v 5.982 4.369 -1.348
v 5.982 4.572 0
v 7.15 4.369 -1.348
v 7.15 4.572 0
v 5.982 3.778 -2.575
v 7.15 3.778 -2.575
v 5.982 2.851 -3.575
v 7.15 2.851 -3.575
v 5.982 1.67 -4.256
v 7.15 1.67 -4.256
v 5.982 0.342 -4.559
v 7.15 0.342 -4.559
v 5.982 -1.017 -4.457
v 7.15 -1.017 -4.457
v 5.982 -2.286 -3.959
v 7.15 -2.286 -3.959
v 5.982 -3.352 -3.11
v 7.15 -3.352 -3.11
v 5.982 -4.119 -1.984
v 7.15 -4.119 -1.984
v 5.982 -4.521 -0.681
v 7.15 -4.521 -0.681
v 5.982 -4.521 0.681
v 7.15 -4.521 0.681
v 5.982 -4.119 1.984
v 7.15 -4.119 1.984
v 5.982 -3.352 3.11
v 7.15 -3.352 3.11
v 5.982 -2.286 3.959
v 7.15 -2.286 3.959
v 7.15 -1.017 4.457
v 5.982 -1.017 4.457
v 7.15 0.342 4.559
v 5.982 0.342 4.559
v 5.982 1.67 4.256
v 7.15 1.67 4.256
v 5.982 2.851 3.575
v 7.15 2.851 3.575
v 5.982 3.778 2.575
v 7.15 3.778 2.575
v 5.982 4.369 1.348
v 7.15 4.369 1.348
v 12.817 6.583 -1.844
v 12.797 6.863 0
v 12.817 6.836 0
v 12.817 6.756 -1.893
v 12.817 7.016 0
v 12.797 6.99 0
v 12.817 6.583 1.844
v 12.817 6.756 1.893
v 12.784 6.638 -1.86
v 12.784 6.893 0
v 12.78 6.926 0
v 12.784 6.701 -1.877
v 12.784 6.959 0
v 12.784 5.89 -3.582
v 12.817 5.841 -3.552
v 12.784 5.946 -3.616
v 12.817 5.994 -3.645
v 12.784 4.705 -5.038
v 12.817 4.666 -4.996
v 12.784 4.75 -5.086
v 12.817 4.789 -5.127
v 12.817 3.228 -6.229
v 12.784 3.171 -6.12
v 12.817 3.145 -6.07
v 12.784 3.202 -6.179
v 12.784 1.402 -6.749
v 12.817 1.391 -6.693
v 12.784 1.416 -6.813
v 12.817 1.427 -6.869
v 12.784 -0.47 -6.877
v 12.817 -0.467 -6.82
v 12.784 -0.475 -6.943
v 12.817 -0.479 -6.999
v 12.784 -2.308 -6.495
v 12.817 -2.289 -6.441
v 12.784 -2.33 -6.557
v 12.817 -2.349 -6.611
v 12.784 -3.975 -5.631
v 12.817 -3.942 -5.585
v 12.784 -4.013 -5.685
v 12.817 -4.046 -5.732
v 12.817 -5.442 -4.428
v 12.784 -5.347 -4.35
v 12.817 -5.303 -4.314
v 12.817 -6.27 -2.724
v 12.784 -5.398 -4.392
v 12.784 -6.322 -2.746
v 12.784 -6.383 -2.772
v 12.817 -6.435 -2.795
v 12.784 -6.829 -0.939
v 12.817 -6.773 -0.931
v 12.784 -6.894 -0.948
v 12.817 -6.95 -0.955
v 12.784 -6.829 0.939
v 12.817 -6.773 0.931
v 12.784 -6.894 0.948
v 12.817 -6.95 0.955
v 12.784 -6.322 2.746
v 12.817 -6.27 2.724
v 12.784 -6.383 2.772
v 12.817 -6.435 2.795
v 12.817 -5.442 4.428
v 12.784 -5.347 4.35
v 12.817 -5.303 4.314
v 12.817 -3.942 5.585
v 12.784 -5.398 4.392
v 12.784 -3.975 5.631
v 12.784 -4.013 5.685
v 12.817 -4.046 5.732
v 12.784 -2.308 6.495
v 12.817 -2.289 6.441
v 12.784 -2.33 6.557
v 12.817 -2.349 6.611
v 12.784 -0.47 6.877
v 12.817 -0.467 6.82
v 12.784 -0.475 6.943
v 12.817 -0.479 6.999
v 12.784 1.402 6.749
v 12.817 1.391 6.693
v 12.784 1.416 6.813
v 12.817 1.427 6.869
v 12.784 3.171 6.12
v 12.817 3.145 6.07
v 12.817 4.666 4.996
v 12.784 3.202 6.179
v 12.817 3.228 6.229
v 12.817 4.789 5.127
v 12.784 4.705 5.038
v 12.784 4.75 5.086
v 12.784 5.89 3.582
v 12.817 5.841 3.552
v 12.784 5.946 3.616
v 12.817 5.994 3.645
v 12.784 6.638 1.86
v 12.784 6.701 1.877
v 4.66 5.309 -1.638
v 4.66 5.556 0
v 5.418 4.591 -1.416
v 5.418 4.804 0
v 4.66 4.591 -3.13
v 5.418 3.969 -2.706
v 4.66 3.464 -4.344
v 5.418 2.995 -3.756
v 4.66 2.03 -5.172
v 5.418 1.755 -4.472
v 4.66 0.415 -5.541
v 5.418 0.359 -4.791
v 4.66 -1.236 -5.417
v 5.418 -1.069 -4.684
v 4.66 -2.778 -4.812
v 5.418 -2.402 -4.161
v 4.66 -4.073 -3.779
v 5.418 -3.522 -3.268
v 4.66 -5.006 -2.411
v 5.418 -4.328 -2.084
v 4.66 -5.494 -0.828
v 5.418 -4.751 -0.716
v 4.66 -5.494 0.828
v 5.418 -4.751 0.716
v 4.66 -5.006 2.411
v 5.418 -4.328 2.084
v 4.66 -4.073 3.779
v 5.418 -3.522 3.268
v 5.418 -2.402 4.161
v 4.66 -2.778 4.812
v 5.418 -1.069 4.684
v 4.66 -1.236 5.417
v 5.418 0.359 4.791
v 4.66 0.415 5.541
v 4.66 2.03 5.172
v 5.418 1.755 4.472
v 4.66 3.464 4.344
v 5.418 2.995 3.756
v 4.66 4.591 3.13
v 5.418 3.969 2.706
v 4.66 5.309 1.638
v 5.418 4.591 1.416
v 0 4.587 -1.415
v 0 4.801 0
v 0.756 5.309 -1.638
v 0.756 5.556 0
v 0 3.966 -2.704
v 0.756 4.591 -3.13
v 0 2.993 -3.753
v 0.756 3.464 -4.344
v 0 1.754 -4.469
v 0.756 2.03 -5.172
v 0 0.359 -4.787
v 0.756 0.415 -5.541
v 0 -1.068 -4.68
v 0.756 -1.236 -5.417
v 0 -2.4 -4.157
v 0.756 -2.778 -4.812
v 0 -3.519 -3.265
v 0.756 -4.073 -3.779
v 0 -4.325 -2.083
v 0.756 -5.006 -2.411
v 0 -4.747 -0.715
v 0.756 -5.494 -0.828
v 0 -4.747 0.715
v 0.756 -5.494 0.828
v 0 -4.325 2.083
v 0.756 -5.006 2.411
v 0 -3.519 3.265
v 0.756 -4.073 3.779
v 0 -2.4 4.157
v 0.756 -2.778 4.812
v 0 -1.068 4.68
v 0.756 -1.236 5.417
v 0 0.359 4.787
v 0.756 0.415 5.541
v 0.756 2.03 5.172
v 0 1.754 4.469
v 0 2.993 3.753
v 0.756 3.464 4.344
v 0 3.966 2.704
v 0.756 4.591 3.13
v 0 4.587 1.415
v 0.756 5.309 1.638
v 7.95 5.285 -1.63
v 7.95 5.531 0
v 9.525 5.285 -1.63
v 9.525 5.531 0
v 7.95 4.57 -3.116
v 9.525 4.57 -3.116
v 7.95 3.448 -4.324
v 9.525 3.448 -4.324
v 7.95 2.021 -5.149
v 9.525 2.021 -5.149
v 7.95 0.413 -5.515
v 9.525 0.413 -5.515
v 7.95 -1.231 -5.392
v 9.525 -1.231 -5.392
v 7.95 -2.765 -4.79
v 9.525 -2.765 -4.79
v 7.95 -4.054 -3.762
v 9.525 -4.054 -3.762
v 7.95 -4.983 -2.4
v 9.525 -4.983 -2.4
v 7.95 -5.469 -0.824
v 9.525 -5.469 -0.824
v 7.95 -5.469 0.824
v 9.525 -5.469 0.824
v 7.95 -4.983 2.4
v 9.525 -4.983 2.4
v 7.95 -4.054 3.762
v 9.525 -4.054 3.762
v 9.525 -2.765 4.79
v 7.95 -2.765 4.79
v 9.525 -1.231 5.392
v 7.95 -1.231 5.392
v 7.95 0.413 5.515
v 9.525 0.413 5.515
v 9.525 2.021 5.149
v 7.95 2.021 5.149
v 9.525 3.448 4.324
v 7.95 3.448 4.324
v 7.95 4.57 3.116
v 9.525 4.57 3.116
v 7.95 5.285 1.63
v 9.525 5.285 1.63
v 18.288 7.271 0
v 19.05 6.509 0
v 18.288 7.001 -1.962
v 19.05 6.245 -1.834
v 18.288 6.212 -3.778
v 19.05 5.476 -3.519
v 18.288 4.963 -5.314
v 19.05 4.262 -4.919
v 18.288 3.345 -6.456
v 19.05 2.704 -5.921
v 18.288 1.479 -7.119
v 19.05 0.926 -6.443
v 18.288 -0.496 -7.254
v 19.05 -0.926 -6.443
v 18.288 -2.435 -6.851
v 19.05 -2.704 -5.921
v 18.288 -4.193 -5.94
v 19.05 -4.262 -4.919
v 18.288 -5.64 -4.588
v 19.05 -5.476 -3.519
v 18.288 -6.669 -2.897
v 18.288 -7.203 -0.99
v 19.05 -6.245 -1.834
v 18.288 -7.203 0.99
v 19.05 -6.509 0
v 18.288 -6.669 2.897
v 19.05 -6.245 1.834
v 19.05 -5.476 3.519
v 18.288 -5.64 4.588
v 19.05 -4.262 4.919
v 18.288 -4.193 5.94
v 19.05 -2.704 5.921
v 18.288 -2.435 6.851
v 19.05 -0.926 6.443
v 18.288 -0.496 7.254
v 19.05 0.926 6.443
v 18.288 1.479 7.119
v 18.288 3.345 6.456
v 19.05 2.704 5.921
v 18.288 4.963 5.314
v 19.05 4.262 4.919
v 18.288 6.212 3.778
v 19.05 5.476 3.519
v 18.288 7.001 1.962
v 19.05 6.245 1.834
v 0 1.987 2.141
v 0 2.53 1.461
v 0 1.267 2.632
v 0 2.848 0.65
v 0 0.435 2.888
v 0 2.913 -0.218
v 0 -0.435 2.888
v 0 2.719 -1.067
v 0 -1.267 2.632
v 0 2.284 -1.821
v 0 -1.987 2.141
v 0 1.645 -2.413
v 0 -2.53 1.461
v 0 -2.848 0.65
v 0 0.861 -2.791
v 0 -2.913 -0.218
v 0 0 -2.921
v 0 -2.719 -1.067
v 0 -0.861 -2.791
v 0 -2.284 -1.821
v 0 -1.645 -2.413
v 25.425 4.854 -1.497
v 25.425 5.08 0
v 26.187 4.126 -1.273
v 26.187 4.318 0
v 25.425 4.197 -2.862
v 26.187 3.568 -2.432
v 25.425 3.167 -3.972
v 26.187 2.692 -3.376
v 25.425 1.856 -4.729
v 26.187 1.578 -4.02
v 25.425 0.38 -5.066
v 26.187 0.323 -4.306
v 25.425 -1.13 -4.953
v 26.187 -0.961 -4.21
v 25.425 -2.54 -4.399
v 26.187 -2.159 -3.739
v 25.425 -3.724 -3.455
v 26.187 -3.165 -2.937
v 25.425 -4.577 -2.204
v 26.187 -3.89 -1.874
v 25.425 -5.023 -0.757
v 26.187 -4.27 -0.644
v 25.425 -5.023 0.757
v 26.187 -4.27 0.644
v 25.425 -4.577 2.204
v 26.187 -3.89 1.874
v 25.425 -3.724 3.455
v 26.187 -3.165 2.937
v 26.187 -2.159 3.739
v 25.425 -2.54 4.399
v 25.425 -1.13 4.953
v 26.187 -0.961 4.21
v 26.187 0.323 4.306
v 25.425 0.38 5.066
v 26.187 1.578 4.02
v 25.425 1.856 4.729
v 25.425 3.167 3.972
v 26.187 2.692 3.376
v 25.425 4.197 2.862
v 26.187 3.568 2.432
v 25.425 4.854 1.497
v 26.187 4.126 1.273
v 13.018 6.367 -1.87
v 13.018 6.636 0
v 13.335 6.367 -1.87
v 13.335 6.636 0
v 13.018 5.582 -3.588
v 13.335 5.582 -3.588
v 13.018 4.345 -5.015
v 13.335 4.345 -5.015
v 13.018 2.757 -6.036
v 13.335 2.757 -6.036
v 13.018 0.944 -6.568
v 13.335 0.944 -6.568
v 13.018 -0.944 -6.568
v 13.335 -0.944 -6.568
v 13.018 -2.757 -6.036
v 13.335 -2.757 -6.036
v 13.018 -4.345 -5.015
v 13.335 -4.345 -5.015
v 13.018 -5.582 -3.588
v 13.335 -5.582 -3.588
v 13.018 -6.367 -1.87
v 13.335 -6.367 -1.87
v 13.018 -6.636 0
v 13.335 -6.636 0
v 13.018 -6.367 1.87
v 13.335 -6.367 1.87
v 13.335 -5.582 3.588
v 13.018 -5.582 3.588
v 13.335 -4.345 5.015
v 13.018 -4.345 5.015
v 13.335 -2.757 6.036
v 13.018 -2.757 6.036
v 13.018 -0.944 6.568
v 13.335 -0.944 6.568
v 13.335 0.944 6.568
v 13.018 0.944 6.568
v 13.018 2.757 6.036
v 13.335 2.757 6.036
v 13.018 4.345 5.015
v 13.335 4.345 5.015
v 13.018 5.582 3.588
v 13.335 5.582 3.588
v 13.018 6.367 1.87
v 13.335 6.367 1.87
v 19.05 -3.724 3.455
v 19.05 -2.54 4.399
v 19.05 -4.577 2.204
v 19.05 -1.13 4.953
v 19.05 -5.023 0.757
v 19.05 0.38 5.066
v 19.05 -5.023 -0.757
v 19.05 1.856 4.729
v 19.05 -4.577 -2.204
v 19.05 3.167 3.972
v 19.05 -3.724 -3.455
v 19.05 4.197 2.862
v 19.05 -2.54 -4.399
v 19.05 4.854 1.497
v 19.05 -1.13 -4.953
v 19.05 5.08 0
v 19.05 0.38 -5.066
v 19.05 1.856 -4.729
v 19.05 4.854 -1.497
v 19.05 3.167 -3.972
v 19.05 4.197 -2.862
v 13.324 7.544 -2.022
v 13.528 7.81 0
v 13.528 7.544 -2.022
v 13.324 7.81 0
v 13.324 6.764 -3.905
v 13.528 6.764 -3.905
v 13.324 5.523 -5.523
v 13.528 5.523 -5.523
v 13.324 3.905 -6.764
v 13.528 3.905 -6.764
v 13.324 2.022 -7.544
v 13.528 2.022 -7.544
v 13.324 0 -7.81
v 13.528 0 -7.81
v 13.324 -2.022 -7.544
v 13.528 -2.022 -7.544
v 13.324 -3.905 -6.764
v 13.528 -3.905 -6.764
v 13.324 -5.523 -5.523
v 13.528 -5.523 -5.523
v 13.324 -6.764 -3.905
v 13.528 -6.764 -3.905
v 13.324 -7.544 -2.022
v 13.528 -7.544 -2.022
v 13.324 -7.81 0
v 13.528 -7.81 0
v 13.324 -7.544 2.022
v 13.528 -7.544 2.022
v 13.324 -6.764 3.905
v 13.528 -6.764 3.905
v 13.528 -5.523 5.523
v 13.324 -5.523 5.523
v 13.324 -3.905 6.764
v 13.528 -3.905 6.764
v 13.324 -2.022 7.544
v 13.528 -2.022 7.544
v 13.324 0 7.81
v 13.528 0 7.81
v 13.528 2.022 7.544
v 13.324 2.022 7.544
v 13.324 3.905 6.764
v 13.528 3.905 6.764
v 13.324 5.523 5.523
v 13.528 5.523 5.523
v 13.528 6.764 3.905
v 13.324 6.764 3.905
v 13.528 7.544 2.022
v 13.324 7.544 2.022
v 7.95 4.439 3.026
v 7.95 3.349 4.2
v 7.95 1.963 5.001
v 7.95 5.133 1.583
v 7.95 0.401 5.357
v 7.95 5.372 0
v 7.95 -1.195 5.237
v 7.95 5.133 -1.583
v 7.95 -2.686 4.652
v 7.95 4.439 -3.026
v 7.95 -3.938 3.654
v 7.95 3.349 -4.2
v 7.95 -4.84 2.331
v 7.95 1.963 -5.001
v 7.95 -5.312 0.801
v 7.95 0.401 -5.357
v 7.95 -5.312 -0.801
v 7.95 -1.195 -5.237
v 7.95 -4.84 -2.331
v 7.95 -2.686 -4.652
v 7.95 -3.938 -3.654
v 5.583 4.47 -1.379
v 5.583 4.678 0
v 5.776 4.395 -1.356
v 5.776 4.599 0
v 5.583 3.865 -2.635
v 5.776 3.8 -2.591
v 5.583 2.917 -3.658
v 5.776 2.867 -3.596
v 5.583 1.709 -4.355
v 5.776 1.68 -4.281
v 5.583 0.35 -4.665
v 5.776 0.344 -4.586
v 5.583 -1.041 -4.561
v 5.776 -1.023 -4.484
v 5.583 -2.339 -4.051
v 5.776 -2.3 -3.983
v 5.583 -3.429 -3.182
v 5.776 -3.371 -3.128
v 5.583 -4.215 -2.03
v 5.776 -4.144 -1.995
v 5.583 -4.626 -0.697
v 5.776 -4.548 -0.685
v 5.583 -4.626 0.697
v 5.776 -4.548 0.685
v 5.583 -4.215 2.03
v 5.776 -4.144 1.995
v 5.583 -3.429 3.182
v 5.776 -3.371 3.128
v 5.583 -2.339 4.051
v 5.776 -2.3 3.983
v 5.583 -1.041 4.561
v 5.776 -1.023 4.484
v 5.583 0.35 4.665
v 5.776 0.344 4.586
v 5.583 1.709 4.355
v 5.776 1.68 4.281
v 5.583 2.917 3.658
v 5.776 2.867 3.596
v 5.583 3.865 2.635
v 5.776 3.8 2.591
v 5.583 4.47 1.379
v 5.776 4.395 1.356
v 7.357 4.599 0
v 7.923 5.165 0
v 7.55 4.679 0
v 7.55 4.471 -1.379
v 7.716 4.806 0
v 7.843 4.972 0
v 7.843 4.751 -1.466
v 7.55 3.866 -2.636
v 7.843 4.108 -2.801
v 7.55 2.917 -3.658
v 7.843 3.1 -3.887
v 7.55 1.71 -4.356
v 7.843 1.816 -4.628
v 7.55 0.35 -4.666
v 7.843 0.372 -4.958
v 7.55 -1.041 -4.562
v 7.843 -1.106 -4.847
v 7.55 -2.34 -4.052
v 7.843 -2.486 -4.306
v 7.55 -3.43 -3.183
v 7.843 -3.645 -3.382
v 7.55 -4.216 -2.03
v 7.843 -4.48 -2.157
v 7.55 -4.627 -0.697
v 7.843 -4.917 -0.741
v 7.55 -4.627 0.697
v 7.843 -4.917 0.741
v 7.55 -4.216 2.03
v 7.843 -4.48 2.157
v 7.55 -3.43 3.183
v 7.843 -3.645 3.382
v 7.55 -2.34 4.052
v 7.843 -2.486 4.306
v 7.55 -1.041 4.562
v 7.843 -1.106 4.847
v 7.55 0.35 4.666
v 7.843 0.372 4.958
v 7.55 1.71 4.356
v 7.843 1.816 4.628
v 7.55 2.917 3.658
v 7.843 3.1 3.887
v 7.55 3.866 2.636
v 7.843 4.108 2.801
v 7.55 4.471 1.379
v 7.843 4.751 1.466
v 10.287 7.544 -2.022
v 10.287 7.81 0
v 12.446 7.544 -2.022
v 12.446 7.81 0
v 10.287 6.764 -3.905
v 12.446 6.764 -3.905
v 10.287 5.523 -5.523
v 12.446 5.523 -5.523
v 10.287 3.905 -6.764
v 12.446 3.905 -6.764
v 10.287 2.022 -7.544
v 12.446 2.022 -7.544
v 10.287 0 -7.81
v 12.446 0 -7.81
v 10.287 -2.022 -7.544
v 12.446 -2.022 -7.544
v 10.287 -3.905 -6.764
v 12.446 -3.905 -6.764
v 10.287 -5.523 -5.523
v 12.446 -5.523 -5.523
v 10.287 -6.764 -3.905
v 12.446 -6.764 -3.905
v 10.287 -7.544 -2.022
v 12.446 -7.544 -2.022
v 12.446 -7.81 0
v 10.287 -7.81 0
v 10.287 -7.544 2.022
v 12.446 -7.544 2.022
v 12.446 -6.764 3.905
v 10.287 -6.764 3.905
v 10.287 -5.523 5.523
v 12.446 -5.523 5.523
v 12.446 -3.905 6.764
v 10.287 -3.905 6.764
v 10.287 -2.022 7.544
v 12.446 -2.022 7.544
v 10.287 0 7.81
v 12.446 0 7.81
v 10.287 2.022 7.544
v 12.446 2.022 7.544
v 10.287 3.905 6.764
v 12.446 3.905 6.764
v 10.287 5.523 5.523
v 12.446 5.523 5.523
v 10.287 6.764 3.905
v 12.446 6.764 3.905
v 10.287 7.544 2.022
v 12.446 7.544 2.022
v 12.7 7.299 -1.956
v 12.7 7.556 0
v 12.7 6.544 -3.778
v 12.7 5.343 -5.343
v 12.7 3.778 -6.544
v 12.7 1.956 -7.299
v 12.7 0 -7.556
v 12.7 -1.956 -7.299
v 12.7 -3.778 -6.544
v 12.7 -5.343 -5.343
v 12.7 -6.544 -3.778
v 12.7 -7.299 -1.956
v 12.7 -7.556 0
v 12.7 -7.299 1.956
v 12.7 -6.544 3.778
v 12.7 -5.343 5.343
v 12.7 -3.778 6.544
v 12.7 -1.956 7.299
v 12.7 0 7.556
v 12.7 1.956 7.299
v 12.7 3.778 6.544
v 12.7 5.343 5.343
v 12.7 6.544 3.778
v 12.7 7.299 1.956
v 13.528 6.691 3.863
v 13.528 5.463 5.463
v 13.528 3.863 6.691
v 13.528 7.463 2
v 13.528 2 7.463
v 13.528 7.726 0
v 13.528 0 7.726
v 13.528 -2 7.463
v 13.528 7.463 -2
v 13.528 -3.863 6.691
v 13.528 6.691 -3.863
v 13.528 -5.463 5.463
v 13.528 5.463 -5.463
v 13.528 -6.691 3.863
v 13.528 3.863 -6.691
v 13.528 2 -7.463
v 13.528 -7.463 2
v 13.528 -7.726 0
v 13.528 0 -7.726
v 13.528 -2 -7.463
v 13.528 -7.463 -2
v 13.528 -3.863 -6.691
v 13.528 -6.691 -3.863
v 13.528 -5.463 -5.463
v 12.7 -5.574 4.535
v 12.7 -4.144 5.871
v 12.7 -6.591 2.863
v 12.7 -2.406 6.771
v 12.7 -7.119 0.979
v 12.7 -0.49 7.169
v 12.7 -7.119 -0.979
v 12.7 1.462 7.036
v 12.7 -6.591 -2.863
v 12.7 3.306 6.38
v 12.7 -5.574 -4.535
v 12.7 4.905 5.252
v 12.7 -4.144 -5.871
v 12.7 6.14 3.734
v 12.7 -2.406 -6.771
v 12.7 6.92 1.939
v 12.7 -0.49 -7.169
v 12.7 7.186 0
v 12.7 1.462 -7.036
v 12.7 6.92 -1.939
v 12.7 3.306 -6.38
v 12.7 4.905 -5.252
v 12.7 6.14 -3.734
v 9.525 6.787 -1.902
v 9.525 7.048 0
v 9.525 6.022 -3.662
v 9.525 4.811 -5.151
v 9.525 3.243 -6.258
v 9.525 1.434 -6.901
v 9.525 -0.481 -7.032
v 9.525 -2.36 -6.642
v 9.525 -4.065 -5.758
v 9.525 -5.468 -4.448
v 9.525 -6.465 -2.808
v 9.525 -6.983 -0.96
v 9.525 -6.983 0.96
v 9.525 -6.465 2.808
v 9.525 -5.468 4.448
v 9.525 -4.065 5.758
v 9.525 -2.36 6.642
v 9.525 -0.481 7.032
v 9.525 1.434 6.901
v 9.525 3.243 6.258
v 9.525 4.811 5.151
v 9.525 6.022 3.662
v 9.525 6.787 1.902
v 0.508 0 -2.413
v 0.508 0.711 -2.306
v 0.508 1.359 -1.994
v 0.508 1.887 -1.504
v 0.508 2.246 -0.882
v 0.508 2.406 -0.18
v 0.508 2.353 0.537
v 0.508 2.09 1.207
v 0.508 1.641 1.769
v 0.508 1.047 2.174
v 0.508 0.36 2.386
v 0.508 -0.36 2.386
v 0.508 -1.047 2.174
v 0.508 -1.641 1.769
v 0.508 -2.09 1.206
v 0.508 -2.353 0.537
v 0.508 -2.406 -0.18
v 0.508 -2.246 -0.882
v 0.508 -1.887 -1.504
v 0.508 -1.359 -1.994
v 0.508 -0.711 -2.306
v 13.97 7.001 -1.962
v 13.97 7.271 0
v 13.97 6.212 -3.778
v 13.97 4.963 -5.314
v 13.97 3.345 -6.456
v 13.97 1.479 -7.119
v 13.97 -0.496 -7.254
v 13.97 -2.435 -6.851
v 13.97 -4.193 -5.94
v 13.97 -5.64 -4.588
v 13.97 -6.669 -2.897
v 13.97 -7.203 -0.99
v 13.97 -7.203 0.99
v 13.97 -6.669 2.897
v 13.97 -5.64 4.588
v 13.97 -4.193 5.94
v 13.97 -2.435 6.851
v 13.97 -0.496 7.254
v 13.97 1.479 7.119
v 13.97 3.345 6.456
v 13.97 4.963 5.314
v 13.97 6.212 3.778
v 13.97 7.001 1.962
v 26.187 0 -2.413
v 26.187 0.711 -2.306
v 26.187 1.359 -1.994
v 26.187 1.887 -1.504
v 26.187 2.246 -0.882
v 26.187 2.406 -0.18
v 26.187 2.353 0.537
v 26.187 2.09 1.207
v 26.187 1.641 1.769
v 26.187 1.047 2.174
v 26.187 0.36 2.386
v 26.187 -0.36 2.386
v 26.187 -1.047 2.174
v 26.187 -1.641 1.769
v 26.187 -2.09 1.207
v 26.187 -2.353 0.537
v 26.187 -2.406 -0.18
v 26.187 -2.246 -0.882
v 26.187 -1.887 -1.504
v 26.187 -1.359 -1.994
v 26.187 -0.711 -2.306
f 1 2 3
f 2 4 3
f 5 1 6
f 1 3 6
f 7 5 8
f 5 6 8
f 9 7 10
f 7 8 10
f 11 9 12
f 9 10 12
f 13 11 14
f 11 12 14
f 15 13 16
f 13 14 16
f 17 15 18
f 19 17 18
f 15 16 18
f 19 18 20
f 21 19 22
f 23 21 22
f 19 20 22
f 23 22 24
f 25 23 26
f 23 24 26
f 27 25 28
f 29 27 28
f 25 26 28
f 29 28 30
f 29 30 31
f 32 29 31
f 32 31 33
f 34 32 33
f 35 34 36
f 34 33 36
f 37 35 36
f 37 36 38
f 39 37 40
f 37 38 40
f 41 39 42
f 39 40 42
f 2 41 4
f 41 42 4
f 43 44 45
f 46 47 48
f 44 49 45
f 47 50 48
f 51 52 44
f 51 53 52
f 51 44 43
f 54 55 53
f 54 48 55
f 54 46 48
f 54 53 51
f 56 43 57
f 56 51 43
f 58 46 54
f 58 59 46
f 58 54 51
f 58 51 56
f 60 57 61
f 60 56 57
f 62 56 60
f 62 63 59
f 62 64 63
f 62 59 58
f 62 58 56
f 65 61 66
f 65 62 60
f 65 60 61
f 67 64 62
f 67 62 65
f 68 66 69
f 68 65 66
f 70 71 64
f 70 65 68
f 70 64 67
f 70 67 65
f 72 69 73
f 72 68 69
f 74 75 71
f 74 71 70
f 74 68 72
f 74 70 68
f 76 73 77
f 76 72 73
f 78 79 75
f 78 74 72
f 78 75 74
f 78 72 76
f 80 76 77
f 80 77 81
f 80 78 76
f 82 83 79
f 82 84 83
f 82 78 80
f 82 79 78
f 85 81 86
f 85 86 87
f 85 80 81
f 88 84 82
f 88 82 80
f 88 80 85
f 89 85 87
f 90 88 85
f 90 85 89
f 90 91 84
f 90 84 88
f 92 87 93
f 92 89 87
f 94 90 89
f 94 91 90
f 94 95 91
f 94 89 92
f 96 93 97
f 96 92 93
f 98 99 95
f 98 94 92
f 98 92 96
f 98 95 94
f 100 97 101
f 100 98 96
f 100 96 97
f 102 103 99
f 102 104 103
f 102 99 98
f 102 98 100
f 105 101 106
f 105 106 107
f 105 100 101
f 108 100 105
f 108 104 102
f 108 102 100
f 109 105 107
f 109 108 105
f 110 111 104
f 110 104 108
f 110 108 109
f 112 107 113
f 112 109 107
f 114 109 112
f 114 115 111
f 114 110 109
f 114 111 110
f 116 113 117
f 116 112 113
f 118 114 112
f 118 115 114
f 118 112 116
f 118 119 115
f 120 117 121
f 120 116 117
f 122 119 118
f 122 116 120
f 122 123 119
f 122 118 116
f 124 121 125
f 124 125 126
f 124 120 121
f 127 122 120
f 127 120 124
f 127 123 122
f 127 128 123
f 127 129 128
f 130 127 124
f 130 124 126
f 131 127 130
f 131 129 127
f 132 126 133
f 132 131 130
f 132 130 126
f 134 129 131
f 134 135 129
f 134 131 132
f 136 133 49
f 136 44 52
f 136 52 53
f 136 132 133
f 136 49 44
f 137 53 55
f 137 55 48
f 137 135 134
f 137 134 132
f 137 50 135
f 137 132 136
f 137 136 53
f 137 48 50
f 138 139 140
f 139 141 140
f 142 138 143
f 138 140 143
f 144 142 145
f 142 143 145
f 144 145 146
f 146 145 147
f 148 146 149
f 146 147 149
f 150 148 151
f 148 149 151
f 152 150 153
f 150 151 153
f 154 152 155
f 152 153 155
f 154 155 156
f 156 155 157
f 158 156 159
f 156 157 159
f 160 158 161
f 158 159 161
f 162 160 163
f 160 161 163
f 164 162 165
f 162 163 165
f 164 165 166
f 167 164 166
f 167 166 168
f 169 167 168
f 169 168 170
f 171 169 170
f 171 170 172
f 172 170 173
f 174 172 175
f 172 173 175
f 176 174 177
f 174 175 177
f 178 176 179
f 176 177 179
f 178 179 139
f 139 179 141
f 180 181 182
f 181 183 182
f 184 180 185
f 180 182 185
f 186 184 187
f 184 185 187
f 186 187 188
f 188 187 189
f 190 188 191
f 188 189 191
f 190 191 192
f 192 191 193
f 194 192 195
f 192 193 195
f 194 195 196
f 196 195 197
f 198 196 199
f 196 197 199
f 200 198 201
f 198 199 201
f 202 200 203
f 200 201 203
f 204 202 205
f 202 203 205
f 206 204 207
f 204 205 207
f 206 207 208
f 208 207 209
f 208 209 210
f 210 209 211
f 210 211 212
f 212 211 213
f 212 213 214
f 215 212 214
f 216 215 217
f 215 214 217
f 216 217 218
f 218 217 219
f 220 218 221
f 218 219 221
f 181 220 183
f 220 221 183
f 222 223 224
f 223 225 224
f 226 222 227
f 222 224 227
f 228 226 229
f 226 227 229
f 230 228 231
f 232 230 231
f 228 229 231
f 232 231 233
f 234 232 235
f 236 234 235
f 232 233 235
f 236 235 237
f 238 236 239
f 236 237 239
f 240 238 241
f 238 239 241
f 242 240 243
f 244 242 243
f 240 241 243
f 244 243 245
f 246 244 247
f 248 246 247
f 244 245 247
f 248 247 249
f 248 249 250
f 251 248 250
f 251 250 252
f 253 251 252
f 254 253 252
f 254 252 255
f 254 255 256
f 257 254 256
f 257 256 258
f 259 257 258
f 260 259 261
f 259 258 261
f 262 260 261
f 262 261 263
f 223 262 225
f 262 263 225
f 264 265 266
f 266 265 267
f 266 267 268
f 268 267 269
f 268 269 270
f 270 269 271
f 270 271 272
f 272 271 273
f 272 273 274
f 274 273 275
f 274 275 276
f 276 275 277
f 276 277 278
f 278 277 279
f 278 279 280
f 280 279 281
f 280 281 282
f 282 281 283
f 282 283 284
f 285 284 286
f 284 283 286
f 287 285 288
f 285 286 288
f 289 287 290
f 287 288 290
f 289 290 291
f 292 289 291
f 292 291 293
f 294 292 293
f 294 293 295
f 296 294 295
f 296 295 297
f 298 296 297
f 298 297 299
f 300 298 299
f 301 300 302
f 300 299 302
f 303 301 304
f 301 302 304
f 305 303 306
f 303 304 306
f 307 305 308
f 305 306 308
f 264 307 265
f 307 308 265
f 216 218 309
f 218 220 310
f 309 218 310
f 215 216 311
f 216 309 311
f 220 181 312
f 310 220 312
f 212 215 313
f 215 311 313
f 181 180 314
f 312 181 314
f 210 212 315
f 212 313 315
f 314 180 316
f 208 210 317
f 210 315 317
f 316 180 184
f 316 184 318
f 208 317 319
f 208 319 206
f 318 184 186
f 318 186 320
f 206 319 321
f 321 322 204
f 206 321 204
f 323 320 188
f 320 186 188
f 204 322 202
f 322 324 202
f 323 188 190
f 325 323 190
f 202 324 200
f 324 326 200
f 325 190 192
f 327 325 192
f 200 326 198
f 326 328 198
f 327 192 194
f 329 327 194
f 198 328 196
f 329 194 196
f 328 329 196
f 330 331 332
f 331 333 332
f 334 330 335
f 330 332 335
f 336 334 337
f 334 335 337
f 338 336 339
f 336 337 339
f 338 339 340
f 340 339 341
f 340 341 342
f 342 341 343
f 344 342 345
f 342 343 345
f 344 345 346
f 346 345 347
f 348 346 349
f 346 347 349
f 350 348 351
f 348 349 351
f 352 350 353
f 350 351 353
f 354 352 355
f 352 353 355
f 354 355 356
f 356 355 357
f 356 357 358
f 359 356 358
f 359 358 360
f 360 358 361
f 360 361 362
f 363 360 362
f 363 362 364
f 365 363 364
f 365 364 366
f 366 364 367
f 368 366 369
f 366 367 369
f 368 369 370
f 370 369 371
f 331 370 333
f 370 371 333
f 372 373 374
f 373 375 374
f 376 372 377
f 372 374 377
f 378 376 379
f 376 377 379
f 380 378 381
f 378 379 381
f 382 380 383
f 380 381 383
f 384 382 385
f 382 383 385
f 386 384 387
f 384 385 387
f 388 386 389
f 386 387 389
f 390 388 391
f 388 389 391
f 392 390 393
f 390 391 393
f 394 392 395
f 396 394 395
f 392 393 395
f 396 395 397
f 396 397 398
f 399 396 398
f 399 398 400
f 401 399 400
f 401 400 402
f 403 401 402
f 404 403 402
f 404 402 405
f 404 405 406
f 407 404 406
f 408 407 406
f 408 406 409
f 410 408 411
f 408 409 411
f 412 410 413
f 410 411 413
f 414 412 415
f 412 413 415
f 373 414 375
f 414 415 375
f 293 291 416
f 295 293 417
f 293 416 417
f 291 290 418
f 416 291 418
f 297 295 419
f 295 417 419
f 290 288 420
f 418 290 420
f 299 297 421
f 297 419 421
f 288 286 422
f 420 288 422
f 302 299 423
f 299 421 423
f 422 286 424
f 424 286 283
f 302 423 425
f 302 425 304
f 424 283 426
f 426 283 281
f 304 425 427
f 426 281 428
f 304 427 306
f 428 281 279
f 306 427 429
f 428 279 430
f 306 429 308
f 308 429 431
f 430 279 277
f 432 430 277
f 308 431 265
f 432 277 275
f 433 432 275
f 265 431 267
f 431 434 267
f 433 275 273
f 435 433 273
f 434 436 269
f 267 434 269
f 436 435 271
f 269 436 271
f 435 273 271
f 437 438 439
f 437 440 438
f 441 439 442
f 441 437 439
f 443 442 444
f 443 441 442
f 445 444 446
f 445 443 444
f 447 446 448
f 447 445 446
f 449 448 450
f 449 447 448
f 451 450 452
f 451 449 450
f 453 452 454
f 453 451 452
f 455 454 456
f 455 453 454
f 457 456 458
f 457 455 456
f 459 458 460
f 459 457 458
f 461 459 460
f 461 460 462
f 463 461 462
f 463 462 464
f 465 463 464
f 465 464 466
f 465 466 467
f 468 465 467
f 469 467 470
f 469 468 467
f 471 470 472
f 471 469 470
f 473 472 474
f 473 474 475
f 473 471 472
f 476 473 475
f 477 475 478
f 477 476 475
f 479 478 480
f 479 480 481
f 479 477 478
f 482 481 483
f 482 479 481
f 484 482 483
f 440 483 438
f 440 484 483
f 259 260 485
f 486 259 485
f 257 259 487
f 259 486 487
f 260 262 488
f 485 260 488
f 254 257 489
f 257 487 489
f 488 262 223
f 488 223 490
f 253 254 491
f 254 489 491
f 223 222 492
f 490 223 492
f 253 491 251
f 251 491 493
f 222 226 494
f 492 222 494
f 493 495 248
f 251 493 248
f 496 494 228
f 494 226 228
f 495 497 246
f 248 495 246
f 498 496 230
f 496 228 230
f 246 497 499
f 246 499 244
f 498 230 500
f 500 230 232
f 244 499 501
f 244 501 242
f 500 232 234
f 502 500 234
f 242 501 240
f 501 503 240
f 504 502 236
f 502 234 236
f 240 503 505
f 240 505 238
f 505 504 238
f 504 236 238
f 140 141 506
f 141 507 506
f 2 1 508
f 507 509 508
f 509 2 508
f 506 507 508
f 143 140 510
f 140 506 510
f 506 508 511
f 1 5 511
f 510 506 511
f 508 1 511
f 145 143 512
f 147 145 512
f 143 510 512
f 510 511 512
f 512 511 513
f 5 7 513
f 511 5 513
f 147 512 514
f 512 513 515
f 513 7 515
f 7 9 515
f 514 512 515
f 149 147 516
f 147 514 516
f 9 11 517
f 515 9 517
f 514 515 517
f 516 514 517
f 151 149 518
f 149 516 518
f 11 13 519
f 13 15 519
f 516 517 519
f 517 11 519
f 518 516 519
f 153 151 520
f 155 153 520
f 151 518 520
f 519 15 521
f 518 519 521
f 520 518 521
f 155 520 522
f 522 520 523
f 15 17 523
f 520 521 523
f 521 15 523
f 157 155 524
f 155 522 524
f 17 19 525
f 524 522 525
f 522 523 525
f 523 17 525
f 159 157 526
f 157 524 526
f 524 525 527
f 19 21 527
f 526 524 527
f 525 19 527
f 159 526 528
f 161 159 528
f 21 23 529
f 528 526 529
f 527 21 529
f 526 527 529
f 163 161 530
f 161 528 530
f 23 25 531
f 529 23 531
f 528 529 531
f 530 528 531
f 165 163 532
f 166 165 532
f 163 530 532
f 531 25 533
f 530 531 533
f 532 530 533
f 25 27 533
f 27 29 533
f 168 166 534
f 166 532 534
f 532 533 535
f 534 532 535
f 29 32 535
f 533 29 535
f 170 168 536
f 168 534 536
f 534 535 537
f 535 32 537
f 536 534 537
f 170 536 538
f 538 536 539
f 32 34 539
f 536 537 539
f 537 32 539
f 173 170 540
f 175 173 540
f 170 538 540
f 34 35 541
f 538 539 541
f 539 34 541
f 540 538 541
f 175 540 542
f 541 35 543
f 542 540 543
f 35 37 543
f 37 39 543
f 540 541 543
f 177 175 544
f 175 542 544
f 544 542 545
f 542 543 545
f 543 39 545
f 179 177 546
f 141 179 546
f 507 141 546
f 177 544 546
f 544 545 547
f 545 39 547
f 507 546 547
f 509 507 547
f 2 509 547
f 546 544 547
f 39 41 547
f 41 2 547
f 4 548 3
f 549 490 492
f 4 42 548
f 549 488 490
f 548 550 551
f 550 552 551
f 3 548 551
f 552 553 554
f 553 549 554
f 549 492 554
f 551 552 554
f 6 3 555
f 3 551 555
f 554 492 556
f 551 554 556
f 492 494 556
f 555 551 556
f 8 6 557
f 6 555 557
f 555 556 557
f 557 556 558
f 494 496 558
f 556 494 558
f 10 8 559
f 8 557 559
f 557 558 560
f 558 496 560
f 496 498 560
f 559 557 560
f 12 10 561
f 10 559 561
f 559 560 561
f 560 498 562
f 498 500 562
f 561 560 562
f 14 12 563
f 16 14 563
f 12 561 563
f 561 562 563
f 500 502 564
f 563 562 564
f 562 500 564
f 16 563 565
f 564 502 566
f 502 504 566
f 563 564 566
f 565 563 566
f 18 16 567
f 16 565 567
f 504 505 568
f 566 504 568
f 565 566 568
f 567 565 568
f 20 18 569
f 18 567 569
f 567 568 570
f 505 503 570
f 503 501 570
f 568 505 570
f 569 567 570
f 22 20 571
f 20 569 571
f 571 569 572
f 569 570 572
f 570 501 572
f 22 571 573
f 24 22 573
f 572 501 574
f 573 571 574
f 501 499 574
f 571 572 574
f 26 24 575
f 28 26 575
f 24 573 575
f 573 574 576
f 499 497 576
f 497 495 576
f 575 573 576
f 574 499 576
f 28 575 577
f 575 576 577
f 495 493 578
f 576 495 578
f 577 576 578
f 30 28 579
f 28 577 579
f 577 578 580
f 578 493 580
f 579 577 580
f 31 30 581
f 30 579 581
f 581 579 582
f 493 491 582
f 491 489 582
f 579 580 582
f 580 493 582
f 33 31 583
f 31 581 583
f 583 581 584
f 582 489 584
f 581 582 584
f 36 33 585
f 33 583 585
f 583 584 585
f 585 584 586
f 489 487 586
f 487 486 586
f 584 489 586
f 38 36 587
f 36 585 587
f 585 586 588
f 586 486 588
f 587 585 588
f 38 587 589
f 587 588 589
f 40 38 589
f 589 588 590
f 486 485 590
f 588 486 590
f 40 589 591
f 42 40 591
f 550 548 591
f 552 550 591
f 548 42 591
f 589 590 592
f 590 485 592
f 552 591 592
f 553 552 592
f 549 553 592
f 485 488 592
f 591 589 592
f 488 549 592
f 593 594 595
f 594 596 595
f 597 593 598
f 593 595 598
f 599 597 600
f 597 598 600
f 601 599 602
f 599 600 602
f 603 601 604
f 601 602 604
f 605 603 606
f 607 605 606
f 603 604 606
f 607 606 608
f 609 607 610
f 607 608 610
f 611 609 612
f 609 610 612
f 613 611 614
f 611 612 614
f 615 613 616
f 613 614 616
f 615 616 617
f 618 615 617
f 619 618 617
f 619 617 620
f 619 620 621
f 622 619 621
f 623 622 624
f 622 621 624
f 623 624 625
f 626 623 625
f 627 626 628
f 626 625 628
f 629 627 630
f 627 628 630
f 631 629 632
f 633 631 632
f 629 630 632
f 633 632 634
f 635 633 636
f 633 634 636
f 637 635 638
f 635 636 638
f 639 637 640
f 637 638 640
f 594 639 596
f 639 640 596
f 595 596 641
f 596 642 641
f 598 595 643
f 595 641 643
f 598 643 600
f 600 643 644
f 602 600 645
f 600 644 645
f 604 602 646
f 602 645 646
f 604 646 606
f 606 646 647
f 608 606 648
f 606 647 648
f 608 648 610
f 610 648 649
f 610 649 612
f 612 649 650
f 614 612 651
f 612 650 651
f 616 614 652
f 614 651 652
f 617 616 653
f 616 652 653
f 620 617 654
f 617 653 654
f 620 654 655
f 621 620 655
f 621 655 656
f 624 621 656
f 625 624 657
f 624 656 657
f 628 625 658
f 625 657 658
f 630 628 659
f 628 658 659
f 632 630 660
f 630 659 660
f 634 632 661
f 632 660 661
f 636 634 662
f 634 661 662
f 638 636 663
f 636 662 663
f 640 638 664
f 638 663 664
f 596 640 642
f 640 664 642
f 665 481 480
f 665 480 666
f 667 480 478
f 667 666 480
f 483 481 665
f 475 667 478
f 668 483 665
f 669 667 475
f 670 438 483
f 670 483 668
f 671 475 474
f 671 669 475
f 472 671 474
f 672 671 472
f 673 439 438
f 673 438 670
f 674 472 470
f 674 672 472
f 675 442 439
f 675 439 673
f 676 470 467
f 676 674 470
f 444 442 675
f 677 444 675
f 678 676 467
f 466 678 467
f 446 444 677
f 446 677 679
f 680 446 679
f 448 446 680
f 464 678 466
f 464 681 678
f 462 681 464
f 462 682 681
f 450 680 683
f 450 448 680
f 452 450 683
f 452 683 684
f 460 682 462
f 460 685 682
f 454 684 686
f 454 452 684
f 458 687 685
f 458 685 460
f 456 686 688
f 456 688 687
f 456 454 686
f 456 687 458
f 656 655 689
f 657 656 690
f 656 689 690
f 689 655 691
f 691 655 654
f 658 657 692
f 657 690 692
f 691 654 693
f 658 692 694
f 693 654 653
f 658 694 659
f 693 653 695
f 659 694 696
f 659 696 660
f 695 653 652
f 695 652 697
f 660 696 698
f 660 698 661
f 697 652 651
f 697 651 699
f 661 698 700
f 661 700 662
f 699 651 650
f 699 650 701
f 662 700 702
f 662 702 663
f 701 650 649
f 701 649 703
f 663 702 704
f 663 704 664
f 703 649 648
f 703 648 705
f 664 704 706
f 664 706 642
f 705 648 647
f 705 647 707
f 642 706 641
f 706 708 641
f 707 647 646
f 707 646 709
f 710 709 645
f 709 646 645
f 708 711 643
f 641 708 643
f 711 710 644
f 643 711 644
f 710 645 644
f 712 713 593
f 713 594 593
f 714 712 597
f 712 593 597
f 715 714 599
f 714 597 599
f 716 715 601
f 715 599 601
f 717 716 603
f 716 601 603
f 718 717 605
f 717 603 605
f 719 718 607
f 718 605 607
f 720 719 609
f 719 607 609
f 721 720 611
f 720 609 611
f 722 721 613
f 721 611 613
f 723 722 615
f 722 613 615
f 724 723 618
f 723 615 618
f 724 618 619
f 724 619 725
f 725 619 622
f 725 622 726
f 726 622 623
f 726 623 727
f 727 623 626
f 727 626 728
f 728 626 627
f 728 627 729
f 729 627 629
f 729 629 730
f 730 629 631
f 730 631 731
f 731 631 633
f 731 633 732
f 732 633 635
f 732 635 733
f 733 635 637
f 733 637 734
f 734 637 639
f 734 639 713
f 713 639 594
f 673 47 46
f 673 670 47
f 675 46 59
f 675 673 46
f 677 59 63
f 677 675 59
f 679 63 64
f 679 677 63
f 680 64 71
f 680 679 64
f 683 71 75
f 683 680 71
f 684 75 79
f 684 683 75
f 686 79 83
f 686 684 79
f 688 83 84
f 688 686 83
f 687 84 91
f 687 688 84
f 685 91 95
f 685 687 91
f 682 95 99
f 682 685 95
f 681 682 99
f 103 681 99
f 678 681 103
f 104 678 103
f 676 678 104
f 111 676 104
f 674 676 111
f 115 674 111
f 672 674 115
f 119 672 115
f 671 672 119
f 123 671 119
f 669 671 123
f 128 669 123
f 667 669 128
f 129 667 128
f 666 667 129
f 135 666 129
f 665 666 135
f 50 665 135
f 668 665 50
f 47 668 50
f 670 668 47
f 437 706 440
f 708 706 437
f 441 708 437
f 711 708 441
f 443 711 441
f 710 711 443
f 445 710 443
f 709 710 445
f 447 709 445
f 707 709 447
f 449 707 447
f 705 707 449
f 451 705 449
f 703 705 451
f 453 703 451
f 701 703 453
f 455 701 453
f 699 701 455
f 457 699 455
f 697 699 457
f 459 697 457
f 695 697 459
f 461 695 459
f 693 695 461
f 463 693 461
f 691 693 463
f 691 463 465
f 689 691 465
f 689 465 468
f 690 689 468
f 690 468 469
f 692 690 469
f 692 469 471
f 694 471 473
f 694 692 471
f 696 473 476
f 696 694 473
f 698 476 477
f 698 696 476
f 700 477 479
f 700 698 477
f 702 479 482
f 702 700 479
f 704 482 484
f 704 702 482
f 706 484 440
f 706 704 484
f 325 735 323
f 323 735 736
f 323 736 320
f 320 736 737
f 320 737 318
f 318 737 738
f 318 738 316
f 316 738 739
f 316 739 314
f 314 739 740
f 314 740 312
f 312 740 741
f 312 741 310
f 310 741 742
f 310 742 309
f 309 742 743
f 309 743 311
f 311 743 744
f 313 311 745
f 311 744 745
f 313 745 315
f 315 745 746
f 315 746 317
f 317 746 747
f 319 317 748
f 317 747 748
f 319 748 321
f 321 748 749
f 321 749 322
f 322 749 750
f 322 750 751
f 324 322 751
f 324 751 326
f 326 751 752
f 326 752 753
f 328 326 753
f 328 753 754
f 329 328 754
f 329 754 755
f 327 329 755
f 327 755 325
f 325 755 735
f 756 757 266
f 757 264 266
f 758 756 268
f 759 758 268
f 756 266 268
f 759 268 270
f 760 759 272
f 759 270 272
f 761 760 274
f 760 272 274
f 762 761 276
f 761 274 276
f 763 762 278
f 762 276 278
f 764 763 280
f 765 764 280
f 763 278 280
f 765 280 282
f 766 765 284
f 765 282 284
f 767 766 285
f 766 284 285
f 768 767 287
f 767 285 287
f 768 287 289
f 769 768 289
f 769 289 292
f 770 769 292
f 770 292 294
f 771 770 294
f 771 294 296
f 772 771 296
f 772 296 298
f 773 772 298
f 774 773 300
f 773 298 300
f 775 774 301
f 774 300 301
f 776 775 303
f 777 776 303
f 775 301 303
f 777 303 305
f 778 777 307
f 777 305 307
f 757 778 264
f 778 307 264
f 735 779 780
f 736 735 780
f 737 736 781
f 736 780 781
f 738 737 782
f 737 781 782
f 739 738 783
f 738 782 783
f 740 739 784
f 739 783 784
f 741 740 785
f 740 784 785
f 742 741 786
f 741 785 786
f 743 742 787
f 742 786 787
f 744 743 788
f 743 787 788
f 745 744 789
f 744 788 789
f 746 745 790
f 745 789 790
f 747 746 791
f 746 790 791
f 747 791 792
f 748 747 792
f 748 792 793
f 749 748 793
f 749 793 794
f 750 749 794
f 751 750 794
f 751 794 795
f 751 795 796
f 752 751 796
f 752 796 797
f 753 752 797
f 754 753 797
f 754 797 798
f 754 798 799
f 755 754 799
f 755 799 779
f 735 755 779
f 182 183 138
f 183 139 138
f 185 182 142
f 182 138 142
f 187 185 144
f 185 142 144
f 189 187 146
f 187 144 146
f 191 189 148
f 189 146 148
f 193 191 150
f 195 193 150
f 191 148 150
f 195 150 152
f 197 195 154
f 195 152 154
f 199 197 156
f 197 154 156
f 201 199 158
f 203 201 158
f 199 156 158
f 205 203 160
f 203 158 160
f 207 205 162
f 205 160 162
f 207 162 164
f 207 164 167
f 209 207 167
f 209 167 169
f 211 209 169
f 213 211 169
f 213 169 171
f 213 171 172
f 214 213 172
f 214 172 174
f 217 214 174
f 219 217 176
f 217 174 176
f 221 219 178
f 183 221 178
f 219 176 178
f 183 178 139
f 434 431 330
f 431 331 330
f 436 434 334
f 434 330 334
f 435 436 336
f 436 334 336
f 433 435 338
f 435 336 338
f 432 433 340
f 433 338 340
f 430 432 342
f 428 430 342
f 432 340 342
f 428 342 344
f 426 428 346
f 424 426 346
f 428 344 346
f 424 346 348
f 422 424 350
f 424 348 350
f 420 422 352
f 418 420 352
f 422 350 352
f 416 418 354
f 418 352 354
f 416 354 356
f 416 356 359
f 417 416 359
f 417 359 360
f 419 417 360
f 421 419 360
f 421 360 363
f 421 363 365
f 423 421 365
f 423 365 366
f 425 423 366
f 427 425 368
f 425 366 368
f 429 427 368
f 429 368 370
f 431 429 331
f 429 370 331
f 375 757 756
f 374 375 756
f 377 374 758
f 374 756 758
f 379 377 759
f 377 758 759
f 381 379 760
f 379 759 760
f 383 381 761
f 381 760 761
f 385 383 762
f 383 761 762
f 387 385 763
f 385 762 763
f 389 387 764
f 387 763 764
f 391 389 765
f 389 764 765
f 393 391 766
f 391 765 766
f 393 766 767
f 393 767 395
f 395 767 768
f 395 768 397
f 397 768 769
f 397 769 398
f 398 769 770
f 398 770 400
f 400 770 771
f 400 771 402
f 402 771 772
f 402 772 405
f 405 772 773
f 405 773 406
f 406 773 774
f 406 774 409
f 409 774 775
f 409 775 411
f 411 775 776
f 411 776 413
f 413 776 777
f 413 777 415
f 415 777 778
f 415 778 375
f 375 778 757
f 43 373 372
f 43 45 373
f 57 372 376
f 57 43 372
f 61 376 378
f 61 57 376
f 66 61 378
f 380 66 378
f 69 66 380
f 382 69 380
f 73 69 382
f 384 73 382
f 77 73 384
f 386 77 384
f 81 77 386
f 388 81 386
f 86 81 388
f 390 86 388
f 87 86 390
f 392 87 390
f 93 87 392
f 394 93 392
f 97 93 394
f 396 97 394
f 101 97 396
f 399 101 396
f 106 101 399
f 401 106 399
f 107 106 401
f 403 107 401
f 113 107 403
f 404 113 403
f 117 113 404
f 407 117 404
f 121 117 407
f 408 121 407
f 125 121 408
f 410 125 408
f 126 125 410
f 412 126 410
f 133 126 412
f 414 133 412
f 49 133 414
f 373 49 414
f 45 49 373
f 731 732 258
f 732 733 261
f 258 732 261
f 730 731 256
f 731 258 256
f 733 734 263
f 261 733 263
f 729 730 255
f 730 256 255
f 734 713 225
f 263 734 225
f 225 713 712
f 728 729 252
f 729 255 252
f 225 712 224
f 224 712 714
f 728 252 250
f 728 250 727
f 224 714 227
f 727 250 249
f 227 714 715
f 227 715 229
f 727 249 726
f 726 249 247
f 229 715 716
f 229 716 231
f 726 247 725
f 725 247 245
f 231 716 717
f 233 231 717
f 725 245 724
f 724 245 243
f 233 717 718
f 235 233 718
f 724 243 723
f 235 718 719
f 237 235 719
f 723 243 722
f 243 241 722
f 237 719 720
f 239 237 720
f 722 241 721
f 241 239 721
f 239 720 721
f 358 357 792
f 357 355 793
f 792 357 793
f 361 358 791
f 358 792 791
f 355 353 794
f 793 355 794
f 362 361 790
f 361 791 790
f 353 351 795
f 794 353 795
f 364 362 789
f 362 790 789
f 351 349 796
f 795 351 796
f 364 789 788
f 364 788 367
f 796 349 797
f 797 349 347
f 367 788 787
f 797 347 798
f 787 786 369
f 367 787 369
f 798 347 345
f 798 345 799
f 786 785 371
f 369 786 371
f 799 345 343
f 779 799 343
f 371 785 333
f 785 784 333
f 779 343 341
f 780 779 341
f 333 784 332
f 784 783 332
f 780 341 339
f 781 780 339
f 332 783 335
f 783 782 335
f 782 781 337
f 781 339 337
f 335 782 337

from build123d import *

# Parameters (mm, degrees)
HOLE1_D           = 4.826
HOLE1_CSINK_D     = 5.842
HOLE1_CSINK_ANGLE = 90


with BuildPart() as part:
    # Sketch1 → Revolve1 (revolve)
    with BuildSketch(Plane.XY):
        with BuildLine():
            Line((0, 0), (0, 4.8006))
            Line((0, 4.8006), (0.75565, 5.55625))
            Line((0.75565, 5.55625), (4.660293864, 5.55625))
            Line((4.660293864, 5.55625), (5.418103291, 4.804192648))
            ThreePointArc((5.418103291, 4.804192648), (5.676923575, 4.6323221), (5.9817, 4.572))
            Line((5.9817, 4.572), (7.1501, 4.572))
            ThreePointArc((7.1501, 4.572), (7.715856136, 4.806343864), (7.9502, 5.3721))
            Line((7.9502, 5.3721), (7.9502, 5.53085))
            Line((7.9502, 5.53085), (9.525, 5.53085))
            Line((9.525, 5.53085), (9.525, 0))
            Line((9.525, 0), (0, 0))
        make_face()
    revolve(axis=Axis((9.525, 0, 0), (-1, 0, 0)))

    # Sketch2 → Revolve2 (revolve)
    with BuildSketch(Plane.XY):
        Polygon((9.525, 0), (9.525, 7.0485), (10.287, 7.8105), (12.446, 7.8105), (12.7, 7.5565), (12.7, 6.63575), (13.335, 6.63575), (13.97, 7.27075), (18.288, 7.27075), (19.05, 6.50875), (19.05, 0), align=None)
    revolve(axis=Axis((19.05, 0, 0), (-1, 0, 0)))

    # Sketch3 → Revolve3 (revolve)
    with BuildSketch(Plane.XY):
        Polygon((19.05, 0), (19.05, 5.08), (25.4254, 5.08), (26.1874, 4.318), (26.1874, 0), align=None)
    revolve(axis=Axis((26.1874, 0, 0), (-1, 0, 0)))

    # Hole1 (through all)
    with Locations(Plane.ZY):
        with Locations((0, 0)):
            CounterSinkHole(HOLE1_D / 2, HOLE1_CSINK_D / 2, counter_sink_angle=HOLE1_CSINK_ANGLE)

    # Sketch6 → Revolve4 (revolve)
    with BuildSketch(Plane.XY):
        with BuildLine():
            Line((12.7, 6.38175), (13.335, 6.38175))
            Line((13.335, 6.38175), (13.335, 6.63575))
            Line((13.335, 6.63575), (13.0175, 6.63575))
            Line((13.0175, 6.63575), (12.817039755, 6.836210245))
            ThreePointArc((12.817039755, 6.836210245), (12.779842316, 6.926012806), (12.817039755, 7.015815367))
            Line((12.817039755, 7.015815367), (13.527556192, 7.726331804))
            Line((13.527556192, 7.726331804), (13.527556192, 7.8105))
            Line((13.527556192, 7.8105), (13.324356192, 7.8105))
            Line((13.324356192, 7.8105), (12.7, 7.186143808))
            Line((12.7, 7.186143808), (12.7, 6.38175))
        make_face()
    revolve(axis=Axis((13.335, 0, 0), (-1, 0, 0)))


solid = part.part
